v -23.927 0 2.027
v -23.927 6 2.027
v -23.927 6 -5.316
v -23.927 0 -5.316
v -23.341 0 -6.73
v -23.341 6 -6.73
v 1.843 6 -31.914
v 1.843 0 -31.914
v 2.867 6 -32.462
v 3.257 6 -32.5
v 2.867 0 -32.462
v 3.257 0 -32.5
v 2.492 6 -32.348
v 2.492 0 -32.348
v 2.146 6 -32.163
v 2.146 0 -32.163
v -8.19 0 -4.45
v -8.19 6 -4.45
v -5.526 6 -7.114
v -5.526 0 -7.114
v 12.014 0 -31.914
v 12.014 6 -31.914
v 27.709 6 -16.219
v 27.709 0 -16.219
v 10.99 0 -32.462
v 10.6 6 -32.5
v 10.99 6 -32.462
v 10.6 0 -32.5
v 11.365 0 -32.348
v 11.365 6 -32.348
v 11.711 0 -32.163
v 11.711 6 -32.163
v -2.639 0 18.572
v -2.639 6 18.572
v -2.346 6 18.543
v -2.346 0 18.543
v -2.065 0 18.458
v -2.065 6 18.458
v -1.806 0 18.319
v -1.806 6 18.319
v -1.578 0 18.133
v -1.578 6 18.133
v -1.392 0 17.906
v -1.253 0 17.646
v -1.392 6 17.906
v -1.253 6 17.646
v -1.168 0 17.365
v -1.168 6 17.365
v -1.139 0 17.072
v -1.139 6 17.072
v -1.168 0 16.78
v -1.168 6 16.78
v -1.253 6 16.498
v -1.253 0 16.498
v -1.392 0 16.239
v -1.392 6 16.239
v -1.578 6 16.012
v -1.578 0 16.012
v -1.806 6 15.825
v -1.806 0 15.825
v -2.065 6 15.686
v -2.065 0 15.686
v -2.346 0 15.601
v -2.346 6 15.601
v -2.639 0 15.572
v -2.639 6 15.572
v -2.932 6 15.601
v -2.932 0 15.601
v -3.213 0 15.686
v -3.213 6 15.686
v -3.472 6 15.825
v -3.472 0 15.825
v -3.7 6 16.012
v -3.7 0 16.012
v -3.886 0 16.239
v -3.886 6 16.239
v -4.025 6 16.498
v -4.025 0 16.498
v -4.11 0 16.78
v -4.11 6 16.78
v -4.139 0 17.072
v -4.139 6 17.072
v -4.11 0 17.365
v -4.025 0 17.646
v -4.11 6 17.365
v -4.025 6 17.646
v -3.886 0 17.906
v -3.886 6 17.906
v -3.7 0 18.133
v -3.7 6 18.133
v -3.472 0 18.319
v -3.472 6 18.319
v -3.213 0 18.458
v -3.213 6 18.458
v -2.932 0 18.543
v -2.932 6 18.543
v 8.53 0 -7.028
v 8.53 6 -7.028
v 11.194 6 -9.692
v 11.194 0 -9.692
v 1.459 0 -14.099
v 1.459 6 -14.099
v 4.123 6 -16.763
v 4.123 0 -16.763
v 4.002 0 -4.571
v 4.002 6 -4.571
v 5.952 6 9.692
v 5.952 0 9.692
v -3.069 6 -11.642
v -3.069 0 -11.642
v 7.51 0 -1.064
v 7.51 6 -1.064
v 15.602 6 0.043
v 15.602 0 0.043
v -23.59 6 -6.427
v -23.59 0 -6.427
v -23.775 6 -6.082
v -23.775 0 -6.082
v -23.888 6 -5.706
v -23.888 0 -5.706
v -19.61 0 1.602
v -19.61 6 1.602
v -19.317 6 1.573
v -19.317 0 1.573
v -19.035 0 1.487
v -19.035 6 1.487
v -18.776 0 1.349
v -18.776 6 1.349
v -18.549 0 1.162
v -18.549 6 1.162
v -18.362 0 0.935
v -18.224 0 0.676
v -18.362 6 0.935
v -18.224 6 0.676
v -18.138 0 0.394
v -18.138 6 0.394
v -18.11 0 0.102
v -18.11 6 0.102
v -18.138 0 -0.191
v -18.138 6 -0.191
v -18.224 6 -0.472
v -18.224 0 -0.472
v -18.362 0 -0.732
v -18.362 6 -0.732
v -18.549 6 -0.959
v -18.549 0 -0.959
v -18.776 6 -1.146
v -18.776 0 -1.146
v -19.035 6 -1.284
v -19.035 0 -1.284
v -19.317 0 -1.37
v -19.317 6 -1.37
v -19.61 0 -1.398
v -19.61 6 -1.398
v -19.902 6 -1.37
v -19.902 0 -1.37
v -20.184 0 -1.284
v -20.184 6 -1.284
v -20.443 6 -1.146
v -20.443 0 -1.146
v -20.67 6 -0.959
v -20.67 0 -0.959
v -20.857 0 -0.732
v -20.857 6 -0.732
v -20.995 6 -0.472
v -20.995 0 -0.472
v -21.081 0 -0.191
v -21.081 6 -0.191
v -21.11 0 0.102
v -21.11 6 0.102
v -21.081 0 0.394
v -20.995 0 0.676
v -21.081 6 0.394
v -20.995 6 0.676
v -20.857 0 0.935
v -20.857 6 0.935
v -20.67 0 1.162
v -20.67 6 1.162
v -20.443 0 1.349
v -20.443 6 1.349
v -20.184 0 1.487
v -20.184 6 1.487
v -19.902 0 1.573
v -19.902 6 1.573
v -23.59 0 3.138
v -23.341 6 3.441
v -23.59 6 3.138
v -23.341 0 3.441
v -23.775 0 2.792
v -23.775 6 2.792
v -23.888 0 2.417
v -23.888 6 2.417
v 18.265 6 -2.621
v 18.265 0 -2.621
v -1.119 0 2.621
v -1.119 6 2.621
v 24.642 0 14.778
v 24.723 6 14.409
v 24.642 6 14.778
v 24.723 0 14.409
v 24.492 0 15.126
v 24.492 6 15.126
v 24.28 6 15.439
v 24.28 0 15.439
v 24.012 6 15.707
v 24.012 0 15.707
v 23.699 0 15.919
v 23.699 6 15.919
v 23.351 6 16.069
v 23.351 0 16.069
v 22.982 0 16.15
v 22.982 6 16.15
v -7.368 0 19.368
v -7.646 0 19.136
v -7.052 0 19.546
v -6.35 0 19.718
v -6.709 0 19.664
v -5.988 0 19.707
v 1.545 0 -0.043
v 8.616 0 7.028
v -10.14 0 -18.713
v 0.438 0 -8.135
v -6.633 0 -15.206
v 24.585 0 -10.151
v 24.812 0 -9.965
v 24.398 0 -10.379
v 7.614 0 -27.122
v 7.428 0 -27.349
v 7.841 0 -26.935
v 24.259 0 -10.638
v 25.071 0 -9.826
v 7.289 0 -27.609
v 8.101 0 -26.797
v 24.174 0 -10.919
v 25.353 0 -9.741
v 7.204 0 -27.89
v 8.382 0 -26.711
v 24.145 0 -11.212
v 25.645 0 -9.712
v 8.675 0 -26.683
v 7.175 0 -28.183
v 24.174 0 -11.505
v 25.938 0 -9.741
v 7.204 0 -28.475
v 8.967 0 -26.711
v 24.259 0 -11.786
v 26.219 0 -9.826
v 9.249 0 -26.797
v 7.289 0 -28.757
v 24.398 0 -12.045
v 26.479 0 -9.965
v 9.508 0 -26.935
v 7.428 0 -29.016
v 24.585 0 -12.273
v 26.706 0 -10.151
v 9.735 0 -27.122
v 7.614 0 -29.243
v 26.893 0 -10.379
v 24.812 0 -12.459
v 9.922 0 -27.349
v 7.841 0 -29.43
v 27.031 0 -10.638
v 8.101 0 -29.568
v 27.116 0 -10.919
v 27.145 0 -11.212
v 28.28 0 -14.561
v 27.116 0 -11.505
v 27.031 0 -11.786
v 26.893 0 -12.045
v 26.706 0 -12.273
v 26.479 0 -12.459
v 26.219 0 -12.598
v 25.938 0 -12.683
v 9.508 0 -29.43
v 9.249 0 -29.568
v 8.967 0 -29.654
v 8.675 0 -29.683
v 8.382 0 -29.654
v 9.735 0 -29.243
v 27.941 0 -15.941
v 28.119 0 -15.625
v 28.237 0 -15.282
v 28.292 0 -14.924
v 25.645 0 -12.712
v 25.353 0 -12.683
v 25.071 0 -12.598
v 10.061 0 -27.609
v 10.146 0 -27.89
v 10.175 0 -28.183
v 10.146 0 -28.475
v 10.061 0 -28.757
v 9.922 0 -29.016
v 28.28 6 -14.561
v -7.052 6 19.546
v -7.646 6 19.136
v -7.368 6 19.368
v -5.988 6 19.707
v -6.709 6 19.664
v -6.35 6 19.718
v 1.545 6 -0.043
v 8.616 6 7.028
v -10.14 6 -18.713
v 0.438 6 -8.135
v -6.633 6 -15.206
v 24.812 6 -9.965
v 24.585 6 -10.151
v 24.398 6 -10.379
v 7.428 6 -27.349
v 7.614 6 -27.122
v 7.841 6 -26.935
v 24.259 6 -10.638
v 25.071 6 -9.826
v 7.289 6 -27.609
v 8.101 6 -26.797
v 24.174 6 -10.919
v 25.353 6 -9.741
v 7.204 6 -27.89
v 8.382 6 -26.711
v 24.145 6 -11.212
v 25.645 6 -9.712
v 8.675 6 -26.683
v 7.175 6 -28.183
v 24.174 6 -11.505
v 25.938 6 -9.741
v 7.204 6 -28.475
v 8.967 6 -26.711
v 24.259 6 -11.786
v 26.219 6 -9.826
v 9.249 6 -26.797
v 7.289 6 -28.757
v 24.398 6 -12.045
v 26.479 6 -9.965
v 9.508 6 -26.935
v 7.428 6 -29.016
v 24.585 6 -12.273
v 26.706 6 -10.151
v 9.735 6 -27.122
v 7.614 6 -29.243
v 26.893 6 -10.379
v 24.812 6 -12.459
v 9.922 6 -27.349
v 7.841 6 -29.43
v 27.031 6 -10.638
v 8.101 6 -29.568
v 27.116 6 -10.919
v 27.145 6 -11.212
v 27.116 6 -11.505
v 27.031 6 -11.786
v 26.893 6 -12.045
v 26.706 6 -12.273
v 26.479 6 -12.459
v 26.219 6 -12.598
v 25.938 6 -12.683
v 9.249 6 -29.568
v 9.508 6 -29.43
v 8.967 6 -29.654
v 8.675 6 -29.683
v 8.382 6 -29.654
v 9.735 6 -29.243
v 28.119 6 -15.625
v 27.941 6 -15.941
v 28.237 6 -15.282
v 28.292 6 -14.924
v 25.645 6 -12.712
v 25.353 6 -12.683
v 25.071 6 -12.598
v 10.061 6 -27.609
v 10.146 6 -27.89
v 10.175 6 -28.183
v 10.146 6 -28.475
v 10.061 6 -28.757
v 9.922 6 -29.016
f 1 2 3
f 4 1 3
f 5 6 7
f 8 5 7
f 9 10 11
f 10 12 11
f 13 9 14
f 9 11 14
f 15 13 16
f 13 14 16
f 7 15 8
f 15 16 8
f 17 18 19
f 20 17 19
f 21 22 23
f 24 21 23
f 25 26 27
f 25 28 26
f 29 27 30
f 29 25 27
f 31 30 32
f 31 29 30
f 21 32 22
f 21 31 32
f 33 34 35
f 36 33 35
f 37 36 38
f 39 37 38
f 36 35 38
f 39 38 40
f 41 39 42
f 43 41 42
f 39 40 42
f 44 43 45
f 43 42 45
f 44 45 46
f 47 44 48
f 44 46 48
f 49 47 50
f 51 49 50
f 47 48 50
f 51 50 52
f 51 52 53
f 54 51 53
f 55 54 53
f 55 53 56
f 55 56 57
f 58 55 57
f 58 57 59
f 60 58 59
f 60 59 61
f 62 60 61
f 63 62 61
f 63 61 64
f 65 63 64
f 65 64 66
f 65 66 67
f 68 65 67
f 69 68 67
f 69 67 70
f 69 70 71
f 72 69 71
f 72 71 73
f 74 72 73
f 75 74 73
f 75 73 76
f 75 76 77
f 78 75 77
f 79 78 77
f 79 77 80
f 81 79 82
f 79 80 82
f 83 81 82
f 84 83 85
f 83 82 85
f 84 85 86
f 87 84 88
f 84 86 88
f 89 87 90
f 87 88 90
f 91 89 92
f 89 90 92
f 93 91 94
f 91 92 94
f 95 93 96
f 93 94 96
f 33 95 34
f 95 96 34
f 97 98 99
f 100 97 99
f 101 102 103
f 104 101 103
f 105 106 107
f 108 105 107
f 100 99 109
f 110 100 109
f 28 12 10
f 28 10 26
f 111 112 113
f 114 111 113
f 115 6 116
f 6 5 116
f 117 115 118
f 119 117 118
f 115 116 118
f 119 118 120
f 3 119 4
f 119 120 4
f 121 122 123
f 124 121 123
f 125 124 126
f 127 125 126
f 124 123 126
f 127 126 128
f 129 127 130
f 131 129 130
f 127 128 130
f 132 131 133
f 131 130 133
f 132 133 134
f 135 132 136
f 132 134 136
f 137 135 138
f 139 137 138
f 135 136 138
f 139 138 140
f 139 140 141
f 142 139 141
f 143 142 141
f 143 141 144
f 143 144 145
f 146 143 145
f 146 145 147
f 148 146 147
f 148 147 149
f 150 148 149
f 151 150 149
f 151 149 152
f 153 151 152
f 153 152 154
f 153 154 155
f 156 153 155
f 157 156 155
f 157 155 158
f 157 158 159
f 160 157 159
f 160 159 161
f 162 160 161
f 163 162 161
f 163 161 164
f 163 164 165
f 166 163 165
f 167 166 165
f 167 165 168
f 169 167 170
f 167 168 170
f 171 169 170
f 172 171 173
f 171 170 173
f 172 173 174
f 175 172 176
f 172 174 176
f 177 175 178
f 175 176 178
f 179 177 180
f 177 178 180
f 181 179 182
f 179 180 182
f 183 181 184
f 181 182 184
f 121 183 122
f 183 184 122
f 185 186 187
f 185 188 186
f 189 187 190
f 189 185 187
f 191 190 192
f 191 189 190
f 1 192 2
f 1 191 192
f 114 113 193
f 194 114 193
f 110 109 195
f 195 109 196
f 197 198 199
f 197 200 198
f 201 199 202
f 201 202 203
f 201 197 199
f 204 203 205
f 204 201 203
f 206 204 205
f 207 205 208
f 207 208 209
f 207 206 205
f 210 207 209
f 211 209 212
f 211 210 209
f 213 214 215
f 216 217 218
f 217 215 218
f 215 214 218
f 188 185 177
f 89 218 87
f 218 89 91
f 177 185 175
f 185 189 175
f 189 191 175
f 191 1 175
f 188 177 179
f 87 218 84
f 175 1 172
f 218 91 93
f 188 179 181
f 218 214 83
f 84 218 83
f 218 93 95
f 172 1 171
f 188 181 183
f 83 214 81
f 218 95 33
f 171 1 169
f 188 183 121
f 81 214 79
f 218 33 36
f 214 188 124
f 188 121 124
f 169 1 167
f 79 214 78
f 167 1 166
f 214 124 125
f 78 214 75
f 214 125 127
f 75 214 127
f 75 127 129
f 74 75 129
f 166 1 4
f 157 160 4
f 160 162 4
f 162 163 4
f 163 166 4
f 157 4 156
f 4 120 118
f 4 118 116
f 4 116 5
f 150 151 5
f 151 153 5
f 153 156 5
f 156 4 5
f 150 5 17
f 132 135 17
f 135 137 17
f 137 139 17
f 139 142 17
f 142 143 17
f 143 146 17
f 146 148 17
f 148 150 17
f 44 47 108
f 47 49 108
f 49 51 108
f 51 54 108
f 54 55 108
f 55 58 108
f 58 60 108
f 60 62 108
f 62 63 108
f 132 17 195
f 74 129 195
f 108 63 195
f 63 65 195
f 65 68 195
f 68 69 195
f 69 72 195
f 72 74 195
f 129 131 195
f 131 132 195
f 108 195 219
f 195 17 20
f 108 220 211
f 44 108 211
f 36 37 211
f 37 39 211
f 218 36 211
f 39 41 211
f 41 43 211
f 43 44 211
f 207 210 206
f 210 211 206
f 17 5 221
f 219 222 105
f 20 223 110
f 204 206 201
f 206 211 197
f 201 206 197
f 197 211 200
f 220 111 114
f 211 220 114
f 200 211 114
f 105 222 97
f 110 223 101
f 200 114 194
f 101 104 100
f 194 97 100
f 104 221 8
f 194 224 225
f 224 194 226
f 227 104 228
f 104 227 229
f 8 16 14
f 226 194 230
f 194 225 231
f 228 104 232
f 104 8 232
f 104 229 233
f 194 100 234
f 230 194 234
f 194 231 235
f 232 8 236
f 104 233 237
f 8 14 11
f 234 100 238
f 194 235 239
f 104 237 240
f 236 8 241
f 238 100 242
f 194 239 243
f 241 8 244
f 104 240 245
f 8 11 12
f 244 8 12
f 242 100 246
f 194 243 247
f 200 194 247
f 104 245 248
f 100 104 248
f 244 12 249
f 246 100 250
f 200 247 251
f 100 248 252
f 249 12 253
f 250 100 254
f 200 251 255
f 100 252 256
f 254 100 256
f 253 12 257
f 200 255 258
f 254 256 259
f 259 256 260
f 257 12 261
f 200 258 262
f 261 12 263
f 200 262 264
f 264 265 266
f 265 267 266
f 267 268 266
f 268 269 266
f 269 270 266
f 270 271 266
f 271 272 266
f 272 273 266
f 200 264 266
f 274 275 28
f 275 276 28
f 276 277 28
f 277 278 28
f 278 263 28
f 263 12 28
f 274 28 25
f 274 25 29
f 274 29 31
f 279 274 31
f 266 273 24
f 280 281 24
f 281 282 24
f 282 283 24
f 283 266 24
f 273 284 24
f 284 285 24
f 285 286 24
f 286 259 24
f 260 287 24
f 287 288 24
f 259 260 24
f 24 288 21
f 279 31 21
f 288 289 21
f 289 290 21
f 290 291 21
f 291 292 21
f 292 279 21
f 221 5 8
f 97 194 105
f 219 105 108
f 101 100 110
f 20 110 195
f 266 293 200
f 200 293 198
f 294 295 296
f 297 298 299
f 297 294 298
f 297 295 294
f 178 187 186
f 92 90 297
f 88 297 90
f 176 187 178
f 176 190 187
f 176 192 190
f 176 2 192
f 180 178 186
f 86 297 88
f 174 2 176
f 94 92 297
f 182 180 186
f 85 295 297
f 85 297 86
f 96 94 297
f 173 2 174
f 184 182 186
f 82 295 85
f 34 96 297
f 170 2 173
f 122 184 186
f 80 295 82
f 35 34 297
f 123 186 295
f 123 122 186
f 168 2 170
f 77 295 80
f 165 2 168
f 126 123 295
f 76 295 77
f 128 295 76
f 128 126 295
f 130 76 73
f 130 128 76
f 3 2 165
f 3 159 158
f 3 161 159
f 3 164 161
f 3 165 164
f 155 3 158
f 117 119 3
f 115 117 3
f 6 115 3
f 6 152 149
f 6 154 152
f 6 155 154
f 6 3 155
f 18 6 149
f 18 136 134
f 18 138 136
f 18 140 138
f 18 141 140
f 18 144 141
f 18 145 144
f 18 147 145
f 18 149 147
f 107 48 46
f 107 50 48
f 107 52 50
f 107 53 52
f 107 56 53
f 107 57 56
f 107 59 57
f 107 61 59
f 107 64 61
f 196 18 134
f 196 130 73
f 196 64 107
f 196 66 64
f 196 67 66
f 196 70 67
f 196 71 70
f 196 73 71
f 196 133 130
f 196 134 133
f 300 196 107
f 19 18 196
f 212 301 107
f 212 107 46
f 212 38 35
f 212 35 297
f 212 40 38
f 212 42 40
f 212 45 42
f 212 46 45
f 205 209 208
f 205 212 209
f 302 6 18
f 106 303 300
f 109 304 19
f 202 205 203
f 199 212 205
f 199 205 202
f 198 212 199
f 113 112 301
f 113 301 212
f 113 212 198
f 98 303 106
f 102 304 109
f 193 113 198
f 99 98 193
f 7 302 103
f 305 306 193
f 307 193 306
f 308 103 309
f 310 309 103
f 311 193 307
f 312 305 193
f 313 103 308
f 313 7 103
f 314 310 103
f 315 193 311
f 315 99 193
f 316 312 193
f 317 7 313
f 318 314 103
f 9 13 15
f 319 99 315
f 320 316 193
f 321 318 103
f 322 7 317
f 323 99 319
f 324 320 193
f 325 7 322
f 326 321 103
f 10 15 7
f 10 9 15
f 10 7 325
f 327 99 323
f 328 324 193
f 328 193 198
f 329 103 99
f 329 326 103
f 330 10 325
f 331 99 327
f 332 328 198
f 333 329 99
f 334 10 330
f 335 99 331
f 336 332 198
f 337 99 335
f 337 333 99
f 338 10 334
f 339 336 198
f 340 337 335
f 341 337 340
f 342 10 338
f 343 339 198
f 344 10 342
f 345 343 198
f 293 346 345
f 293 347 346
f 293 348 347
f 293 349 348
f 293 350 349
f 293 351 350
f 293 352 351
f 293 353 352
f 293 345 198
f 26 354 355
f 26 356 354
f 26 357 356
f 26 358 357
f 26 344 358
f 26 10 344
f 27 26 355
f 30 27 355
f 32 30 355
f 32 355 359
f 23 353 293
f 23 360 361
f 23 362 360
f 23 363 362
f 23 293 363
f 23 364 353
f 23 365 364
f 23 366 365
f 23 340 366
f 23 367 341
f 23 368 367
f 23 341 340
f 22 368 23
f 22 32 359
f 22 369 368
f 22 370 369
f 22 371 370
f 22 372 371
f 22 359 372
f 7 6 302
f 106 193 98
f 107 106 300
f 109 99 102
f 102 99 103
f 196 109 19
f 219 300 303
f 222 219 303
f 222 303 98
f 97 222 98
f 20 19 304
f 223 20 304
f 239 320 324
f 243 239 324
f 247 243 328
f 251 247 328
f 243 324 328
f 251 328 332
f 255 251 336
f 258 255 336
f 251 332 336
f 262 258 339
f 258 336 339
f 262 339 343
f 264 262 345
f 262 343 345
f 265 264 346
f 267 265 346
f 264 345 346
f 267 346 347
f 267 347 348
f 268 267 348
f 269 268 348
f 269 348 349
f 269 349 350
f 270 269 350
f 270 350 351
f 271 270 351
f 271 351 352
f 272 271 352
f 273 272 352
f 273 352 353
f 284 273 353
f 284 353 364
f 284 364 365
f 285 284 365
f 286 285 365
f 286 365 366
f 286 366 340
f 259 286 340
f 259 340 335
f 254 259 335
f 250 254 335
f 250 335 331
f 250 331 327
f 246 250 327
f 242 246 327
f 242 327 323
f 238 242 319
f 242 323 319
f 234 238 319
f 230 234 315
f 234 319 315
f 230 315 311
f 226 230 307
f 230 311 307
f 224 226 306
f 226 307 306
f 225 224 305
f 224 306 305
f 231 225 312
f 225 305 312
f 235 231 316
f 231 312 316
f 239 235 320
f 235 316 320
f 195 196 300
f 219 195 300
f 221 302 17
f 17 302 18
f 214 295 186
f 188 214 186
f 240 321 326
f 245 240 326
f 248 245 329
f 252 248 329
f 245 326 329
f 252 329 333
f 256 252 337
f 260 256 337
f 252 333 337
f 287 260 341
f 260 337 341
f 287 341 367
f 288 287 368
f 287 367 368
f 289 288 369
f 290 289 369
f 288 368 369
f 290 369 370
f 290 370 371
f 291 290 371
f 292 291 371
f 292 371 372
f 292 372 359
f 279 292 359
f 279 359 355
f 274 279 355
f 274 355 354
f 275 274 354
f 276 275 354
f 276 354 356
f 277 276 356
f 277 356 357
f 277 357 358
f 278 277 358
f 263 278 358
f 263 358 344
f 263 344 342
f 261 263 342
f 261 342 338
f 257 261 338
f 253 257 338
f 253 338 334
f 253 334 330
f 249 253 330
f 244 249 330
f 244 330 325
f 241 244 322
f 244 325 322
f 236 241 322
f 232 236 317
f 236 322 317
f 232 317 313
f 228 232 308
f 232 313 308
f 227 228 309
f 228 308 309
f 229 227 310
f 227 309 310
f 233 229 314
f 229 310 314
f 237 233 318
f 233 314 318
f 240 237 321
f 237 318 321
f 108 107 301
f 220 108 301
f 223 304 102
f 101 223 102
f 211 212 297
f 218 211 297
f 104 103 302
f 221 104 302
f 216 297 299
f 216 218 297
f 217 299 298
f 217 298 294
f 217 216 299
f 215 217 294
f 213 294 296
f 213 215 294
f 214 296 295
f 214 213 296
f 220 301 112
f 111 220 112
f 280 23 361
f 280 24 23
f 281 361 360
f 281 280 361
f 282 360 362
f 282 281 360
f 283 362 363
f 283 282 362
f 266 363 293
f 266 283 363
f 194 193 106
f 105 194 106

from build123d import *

# Parameters (mm, degrees)
SKETCH_1_W          = 60
SKETCH_1_H          = 65
EXTRUDE_1_DEPTH     = 6
SKETCH_4_R          = 1.5
CUT_EXTRUDE_1_DEPTH = 8
CUT_EXTRUDE_2_DEPTH = 8
SKETCH_7_R          = 1.5
CUT_EXTRUDE_3_DEPTH = 8
SKETCH_8_R          = 1.5
CUT_EXTRUDE_4_DEPTH = 10
FILLET_1_R          = 2


with BuildPart() as part:
    # 草图1 → 凸台-拉伸1 (new body)
    with BuildSketch(Plane(origin=(0, 0, 0), x_dir=(1, 0, 0), z_dir=(0, 1, 0))):
        Rectangle(SKETCH_1_W, SKETCH_1_H)
    extrude(amount=EXTRUDE_1_DEPTH)

    # 草图4 → 切除-拉伸1 (cut)
    with BuildSketch(Plane(origin=(0, 6, 0), x_dir=(1, 0, 0), z_dir=(0, 1, 0))):
        with Locations(Location((-19.60951637, -0.101604527, 0), (0, 0, 270))):
            Circle(SKETCH_4_R)
        with Locations(Location((8.674754878, 28.18266672, 0), (0, 0, 270))):
            Circle(SKETCH_4_R)
        with Locations(Location((-2.638953621, -17.072167276, 0), (0, 0, 270))):
            Circle(SKETCH_4_R)
        with Locations(Location((25.645317626, 11.212103971, 0), (0, 0, 270))):
            Circle(SKETCH_4_R)
    extrude(amount=-CUT_EXTRUDE_1_DEPTH, mode=Mode.SUBTRACT)

    # 草图5 → 切除-拉伸2 (cut)
    with BuildSketch(Plane(origin=(0, 6, 0), x_dir=(1, 0, 0), z_dir=(0, 1, 0))):
        Polygon((-10.140132024, 18.713282374), (-8.189895494, 4.450031542), (-5.526194118, 7.113732918), (-6.63263276, 15.205783111), (1.459417432, 14.099344468), (4.123118808, 16.763045844), align=None)
        Polygon((11.19418662, 9.691978032), (-3.069064212, 11.642214563), (-1.118827682, -2.621036269), (1.544873694, 0.042665106), (0.438435051, 8.134715299), (8.530485244, 7.028276656), align=None)
        Polygon((18.265254432, 2.62091022), (4.0020036, 4.571146751), (5.95224013, -9.692104081), (8.615941506, -7.028402705), (7.509502863, 1.063647487), (15.601553056, -0.042791156), align=None)
    extrude(amount=-CUT_EXTRUDE_2_DEPTH, mode=Mode.SUBTRACT)

    # 草图7 → 切除-拉伸3 (cut)
    with BuildSketch(Plane(origin=(0, 6, 0), x_dir=(1, 0, 0), z_dir=(0, 1, 0))):
        with Locations(Location((-21, -24.5, 0), (0, 0, 270))):
            Circle(SKETCH_7_R)
        with Locations(Location((-21, -16.5, 0), (0, 0, 270))):
            Circle(SKETCH_7_R)
        with Locations(Location((-21, 24.5, 0), (0, 0, 270))):
            Circle(SKETCH_7_R)
        with Locations(Location((-21, 16.5, 0), (0, 0, 270))):
            Circle(SKETCH_7_R)
    extrude(amount=-CUT_EXTRUDE_3_DEPTH, mode=Mode.SUBTRACT)

    # 草图8 → 切除-拉伸4 (cut)
    with BuildSketch(Plane(origin=(0, 6, 0), x_dir=(1, 0, 0), z_dir=(0, 1, 0))):
        Polygon((30, 32.5), (11.42848941, 32.5), (28.399052158, 15.529437252), (24.532691742, -15.959541392), (-6.956286901, -19.825901808), (-23.92684965, -2.855339059), (-23.92684965, 6.144660941), (2.42848941, 32.5), (-30, 32.5), (-30, -32.5), (30, -32.5), align=None)
        with Locations((-21, -24.5)):
            Circle(SKETCH_8_R, mode=Mode.SUBTRACT)
        with Locations((-21, -16.5)):
            Circle(SKETCH_8_R, mode=Mode.SUBTRACT)
        with Locations((-21, 16.5)):
            Circle(SKETCH_8_R, mode=Mode.SUBTRACT)
        with Locations((-21, 24.5)):
            Circle(SKETCH_8_R, mode=Mode.SUBTRACT)
    extrude(amount=-CUT_EXTRUDE_4_DEPTH, mode=Mode.SUBTRACT)

    # 圆角1
    fillet_1_edges = [part.edges().sort_by_distance(p)[0] for p in [
        (2.42848941, 3, -32.5),
        (-23.92684965, 3, -6.144660941),
        (-23.92684965, 3, 2.855339059),
        (-6.956286901, 3, 19.825901808),
        (24.532691742, 3, 15.959541392),
        (28.399052158, 3, -15.529437252),
        (11.42848941, 3, -32.5),
    ]]
    fillet(fillet_1_edges, radius=FILLET_1_R)


solid = part.part
